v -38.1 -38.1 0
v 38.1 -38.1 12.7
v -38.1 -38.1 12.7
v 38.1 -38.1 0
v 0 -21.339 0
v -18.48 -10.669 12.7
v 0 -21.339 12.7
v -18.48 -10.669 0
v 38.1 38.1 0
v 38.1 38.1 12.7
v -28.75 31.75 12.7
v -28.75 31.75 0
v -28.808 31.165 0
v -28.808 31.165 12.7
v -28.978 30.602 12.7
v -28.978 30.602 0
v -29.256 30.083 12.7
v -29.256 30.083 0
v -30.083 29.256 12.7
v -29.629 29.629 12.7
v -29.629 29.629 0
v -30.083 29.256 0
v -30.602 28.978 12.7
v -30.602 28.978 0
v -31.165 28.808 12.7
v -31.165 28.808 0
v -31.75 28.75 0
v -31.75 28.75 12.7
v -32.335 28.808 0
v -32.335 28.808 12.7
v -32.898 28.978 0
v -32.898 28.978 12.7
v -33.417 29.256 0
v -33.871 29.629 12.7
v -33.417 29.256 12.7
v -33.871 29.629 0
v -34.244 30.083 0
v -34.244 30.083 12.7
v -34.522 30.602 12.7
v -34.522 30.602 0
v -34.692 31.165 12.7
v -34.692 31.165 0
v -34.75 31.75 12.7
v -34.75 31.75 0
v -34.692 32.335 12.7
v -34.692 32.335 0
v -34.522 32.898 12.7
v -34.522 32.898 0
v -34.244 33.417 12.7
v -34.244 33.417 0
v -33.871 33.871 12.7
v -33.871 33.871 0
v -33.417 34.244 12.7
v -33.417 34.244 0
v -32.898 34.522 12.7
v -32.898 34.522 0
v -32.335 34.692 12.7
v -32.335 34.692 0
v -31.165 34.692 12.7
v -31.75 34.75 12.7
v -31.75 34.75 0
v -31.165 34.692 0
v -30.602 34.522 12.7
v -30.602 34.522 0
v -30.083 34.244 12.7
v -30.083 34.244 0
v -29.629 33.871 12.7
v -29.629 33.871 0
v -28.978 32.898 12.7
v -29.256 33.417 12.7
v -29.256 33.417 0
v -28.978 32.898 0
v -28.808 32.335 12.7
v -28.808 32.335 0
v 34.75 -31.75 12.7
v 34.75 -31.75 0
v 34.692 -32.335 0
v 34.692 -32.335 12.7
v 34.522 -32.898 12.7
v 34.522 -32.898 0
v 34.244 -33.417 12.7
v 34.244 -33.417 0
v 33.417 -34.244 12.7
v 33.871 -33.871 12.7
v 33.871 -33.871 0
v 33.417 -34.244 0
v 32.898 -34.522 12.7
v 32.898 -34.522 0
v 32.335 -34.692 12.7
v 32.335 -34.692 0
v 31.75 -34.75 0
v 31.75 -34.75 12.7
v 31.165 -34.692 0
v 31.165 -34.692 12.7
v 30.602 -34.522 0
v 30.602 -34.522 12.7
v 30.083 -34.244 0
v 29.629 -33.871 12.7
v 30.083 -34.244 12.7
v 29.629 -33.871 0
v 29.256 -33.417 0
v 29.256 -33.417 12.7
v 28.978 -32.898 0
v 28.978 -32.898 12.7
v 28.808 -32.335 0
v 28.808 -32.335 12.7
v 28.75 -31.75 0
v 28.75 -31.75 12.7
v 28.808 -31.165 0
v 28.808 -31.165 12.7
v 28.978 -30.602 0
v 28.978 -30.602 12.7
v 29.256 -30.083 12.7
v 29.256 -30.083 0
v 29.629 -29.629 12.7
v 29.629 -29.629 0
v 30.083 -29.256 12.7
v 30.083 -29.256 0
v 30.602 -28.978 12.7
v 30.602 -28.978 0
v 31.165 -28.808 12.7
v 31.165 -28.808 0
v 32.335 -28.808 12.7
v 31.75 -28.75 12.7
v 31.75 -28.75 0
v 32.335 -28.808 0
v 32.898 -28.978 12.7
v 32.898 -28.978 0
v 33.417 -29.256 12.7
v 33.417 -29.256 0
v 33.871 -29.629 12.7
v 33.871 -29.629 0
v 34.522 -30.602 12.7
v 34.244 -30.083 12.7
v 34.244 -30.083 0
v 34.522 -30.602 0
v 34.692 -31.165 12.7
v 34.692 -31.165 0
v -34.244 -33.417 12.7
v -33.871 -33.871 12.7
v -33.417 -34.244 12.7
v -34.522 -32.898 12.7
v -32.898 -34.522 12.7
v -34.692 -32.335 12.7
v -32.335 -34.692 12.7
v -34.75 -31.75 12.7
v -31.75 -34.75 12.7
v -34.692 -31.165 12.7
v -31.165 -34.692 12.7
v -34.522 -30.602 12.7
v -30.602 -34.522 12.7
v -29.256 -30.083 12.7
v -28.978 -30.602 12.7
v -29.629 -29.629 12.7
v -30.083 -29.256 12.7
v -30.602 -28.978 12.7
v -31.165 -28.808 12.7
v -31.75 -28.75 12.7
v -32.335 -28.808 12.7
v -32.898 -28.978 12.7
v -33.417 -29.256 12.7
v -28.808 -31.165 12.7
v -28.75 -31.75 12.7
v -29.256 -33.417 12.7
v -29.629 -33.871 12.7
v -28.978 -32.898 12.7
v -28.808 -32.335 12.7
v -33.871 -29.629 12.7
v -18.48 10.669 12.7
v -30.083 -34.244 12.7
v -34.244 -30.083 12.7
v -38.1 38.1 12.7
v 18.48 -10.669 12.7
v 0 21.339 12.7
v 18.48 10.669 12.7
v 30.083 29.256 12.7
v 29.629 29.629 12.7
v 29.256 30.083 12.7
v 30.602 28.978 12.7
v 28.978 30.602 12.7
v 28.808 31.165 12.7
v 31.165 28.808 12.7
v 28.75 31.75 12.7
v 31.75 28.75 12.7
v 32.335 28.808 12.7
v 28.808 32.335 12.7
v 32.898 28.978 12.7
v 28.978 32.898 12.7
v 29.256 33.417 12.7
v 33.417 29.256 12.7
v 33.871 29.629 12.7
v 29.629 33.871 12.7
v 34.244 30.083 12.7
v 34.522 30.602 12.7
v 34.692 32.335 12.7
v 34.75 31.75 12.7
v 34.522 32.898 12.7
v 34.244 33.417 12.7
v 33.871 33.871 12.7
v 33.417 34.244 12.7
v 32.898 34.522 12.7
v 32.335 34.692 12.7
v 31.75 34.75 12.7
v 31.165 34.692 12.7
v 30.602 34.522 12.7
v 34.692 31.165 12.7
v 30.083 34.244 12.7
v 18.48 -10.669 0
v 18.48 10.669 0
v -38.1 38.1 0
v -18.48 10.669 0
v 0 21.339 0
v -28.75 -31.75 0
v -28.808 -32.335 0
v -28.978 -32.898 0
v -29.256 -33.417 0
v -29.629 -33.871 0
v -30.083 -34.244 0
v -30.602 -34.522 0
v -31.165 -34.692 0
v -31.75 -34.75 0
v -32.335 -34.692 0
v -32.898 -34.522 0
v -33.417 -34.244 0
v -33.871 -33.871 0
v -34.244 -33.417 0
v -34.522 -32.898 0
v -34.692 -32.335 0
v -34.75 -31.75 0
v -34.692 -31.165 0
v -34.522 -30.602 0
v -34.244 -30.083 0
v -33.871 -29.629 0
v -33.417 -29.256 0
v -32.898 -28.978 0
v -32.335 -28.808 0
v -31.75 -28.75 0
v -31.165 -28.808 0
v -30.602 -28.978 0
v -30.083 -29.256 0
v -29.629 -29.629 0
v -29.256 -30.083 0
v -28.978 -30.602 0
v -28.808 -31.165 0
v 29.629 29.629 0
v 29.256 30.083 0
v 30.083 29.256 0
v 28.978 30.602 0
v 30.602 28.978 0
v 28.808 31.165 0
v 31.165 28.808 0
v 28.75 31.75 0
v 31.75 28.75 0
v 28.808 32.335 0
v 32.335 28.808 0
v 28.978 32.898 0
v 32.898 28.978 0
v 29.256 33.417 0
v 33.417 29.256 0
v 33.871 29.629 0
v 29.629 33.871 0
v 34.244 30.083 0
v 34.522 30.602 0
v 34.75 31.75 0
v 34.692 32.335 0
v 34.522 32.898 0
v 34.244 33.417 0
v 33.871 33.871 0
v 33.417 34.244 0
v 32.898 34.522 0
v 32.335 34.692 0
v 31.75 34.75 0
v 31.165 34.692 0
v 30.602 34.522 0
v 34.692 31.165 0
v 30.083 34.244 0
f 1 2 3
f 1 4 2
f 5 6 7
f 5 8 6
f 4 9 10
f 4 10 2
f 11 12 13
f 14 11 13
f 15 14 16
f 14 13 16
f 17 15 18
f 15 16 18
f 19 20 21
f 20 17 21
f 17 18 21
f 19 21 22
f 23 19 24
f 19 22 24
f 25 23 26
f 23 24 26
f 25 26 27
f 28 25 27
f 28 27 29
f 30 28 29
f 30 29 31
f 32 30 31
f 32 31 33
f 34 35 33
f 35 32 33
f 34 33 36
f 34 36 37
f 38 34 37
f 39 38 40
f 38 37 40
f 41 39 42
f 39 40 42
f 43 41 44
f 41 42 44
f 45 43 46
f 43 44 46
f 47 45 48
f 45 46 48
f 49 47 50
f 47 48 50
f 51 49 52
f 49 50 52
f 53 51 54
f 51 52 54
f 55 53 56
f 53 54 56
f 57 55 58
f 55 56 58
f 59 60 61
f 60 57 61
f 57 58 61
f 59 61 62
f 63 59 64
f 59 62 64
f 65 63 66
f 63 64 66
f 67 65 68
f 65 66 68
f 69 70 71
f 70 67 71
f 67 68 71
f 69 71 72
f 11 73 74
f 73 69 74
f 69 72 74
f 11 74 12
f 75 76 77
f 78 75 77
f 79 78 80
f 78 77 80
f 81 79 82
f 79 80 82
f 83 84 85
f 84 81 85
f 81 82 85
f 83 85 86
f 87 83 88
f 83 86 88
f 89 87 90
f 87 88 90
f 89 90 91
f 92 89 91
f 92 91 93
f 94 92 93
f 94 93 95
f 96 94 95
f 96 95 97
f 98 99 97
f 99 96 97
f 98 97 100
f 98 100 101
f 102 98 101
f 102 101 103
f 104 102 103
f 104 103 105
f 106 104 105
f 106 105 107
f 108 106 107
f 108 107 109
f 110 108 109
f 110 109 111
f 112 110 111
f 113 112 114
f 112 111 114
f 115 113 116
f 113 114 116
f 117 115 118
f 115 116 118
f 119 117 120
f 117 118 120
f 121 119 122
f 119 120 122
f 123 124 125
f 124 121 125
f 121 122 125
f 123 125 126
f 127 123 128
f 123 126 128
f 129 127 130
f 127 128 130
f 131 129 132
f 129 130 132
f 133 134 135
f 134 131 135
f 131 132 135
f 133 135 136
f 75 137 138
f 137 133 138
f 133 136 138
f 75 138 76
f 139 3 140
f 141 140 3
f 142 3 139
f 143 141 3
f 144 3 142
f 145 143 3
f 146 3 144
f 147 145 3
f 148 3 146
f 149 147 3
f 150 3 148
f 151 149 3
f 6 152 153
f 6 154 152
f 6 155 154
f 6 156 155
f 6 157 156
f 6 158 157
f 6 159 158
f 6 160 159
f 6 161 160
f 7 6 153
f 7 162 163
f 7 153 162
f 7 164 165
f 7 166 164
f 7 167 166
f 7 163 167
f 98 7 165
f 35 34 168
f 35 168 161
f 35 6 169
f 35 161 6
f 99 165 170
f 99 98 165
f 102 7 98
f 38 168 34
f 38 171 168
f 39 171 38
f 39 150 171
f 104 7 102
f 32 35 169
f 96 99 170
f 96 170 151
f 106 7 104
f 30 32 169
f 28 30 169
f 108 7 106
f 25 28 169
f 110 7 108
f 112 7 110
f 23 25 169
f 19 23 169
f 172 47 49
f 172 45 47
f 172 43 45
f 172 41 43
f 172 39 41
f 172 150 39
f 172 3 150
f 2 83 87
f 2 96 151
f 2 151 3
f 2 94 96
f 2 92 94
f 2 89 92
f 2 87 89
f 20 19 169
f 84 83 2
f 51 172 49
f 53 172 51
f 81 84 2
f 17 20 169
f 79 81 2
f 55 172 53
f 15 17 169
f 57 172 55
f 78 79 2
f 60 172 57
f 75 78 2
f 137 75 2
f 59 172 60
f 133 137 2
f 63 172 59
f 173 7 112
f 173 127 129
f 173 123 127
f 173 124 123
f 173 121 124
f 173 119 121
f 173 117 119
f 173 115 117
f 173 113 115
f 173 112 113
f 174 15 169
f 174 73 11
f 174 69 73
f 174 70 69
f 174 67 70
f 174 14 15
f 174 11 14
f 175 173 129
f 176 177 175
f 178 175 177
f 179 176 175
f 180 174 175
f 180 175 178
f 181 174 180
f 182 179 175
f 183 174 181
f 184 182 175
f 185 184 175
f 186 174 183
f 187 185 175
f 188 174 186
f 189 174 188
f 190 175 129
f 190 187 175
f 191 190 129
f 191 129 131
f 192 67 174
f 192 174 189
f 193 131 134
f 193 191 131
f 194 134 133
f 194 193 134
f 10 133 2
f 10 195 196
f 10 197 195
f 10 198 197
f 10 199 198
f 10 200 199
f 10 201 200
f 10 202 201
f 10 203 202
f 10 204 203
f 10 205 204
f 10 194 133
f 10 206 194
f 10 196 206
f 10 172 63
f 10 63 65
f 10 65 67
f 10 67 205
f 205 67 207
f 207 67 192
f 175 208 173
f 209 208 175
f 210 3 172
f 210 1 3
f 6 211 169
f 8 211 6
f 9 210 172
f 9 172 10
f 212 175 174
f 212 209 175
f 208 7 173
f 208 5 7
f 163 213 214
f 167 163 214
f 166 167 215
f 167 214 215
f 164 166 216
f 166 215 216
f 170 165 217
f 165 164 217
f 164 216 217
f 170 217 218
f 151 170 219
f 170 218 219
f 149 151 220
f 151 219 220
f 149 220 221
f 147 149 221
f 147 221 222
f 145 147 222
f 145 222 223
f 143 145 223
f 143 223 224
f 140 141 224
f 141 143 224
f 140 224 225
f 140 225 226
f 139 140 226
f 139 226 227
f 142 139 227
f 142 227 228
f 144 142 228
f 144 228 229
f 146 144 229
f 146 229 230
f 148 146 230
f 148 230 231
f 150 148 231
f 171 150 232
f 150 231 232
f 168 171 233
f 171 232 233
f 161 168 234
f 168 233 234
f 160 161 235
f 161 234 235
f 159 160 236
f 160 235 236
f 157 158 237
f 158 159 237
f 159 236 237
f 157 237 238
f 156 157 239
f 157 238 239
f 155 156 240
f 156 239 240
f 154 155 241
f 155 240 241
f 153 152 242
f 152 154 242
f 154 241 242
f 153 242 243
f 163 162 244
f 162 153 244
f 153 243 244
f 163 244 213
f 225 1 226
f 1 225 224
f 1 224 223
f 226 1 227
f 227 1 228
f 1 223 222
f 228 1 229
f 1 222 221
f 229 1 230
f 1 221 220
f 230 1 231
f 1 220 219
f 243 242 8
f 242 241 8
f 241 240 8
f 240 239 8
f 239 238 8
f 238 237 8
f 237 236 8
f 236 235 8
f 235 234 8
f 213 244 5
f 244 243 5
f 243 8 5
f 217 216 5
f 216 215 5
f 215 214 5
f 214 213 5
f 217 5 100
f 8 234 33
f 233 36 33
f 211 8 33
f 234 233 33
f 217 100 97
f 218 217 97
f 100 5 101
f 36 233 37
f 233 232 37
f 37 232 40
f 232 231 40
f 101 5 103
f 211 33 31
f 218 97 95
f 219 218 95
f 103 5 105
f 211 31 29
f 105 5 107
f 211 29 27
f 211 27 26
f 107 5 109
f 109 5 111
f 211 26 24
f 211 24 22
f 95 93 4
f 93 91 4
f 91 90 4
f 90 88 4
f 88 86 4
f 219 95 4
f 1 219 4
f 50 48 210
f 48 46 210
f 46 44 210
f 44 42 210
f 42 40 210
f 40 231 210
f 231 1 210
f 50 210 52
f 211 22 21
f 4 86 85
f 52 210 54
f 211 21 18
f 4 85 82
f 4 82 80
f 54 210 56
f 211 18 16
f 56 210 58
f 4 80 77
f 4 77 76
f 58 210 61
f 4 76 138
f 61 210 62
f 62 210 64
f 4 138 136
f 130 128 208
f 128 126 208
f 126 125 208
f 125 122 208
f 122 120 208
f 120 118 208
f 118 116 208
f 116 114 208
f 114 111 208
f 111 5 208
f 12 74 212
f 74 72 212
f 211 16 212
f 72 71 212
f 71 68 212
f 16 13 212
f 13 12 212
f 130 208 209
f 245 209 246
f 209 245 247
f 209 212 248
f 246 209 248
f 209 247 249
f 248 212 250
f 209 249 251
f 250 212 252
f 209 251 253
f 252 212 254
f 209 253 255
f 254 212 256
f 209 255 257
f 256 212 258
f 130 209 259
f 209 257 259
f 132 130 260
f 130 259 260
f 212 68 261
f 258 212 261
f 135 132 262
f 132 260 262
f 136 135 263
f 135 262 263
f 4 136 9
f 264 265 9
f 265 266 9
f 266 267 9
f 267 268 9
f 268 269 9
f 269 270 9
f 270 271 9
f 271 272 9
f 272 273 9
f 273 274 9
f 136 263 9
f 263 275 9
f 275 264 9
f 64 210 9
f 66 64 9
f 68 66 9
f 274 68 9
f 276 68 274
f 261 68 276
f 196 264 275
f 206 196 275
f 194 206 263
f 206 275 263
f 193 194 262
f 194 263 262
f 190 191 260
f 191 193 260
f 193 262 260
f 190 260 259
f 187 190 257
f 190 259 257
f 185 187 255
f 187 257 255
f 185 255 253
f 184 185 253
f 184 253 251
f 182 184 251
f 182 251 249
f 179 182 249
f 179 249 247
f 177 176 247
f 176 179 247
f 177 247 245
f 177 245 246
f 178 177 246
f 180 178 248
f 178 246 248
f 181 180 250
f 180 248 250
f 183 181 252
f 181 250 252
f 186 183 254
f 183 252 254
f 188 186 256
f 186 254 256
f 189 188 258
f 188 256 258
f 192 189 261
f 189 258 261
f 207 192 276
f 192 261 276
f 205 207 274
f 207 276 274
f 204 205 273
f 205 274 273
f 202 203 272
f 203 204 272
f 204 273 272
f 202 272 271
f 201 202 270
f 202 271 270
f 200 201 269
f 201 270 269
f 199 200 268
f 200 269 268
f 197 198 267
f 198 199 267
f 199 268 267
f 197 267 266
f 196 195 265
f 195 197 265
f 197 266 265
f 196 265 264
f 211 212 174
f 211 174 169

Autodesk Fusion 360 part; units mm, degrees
sketch "Sketch1" plane through (0, 0, 0) normal (0, 0, 1) x (1, 0, 0)
  line L0 (18.48, 10.6694) -> (0, 21.3389)
  line L1 (0, 21.3389) -> (-18.48, 10.6694)
  line L2 (-18.48, 10.6694) -> (-18.48, -10.6694)
  line L3 (-18.48, -10.6694) -> (0, -21.3389)
  line L4 (0, -21.3389) -> (18.48, -10.6694)
  line L5 (18.48, -10.6694) -> (18.48, 10.6694)
  line L6 (38.1, -38.1) -> (-38.1, -38.1)
  line L7 (-38.1, -38.1) -> (-38.1, 38.1)
  line L8 (-38.1, 38.1) -> (38.1, 38.1)
  line L9 (38.1, 38.1) -> (38.1, -38.1)
  line L10 (38.1, -38.1) -> (-38.1, 38.1) construction
  line L11 (-38.1, -38.1) -> (38.1, 38.1) construction
  line L12 (31.75, 31.75) -> (-31.75, 31.75) construction
  line L13 (-31.75, 31.75) -> (-31.75, -31.75) construction
  line L14 (-31.75, -31.75) -> (31.75, -31.75) construction
  line L15 (31.75, -31.75) -> (31.75, 31.75) construction
  line L16 (31.75, 31.75) -> (-31.75, -31.75) construction
  line L17 (-31.75, 31.75) -> (31.75, -31.75) construction
  circle A0 centre (-31.75, 31.75) radius 3
  circle A1 centre (-31.75, -31.75) radius 3
  circle A2 centre (31.75, -31.75) radius 3
  circle A3 centre (31.75, 31.75) radius 3
  dimension "d1" = 18.48
  dimension "d2" = 76.2
  dimension "d3" = 76.2
  dimension "d4" = 63.5
  dimension "d5" = 63.5
  dimension "d6" = 6
  dimension "d8" = 360
extrude "Extrude1" add sketch "Sketch1" along normal blind 12.7
sketch "Sketch2" plane through (0, 0, 12.7) normal (0, 0, 1) x (-1, 0, 0)
  circle A0 centre (31.75, 31.75) radius 3
  circle A1 centre (-31.75, -31.75) radius 3
  line L0 (-18.48, -10.6694) -> (-18.48, 10.6694)
  line L1 (-18.48, 10.6694) -> (0, 21.3389)
  line L2 (0, 21.3389) -> (18.48, 10.6694)
  line L3 (18.48, 10.6694) -> (18.48, -10.6694)
  line L4 (18.48, -10.6694) -> (0, -21.3389)
  line L5 (0, -21.3389) -> (-18.48, -10.6694)
  circle A2 centre (-31.75, 31.75) radius 3
  circle A3 centre (31.75, -31.75) radius 3
  line L6 (-38.1, -38.1) -> (38.1, -38.1)
  line L7 (38.1, -38.1) -> (38.1, 38.1)
  line L8 (38.1, 38.1) -> (-38.1, 38.1)
  line L9 (-38.1, 38.1) -> (-38.1, -38.1)
